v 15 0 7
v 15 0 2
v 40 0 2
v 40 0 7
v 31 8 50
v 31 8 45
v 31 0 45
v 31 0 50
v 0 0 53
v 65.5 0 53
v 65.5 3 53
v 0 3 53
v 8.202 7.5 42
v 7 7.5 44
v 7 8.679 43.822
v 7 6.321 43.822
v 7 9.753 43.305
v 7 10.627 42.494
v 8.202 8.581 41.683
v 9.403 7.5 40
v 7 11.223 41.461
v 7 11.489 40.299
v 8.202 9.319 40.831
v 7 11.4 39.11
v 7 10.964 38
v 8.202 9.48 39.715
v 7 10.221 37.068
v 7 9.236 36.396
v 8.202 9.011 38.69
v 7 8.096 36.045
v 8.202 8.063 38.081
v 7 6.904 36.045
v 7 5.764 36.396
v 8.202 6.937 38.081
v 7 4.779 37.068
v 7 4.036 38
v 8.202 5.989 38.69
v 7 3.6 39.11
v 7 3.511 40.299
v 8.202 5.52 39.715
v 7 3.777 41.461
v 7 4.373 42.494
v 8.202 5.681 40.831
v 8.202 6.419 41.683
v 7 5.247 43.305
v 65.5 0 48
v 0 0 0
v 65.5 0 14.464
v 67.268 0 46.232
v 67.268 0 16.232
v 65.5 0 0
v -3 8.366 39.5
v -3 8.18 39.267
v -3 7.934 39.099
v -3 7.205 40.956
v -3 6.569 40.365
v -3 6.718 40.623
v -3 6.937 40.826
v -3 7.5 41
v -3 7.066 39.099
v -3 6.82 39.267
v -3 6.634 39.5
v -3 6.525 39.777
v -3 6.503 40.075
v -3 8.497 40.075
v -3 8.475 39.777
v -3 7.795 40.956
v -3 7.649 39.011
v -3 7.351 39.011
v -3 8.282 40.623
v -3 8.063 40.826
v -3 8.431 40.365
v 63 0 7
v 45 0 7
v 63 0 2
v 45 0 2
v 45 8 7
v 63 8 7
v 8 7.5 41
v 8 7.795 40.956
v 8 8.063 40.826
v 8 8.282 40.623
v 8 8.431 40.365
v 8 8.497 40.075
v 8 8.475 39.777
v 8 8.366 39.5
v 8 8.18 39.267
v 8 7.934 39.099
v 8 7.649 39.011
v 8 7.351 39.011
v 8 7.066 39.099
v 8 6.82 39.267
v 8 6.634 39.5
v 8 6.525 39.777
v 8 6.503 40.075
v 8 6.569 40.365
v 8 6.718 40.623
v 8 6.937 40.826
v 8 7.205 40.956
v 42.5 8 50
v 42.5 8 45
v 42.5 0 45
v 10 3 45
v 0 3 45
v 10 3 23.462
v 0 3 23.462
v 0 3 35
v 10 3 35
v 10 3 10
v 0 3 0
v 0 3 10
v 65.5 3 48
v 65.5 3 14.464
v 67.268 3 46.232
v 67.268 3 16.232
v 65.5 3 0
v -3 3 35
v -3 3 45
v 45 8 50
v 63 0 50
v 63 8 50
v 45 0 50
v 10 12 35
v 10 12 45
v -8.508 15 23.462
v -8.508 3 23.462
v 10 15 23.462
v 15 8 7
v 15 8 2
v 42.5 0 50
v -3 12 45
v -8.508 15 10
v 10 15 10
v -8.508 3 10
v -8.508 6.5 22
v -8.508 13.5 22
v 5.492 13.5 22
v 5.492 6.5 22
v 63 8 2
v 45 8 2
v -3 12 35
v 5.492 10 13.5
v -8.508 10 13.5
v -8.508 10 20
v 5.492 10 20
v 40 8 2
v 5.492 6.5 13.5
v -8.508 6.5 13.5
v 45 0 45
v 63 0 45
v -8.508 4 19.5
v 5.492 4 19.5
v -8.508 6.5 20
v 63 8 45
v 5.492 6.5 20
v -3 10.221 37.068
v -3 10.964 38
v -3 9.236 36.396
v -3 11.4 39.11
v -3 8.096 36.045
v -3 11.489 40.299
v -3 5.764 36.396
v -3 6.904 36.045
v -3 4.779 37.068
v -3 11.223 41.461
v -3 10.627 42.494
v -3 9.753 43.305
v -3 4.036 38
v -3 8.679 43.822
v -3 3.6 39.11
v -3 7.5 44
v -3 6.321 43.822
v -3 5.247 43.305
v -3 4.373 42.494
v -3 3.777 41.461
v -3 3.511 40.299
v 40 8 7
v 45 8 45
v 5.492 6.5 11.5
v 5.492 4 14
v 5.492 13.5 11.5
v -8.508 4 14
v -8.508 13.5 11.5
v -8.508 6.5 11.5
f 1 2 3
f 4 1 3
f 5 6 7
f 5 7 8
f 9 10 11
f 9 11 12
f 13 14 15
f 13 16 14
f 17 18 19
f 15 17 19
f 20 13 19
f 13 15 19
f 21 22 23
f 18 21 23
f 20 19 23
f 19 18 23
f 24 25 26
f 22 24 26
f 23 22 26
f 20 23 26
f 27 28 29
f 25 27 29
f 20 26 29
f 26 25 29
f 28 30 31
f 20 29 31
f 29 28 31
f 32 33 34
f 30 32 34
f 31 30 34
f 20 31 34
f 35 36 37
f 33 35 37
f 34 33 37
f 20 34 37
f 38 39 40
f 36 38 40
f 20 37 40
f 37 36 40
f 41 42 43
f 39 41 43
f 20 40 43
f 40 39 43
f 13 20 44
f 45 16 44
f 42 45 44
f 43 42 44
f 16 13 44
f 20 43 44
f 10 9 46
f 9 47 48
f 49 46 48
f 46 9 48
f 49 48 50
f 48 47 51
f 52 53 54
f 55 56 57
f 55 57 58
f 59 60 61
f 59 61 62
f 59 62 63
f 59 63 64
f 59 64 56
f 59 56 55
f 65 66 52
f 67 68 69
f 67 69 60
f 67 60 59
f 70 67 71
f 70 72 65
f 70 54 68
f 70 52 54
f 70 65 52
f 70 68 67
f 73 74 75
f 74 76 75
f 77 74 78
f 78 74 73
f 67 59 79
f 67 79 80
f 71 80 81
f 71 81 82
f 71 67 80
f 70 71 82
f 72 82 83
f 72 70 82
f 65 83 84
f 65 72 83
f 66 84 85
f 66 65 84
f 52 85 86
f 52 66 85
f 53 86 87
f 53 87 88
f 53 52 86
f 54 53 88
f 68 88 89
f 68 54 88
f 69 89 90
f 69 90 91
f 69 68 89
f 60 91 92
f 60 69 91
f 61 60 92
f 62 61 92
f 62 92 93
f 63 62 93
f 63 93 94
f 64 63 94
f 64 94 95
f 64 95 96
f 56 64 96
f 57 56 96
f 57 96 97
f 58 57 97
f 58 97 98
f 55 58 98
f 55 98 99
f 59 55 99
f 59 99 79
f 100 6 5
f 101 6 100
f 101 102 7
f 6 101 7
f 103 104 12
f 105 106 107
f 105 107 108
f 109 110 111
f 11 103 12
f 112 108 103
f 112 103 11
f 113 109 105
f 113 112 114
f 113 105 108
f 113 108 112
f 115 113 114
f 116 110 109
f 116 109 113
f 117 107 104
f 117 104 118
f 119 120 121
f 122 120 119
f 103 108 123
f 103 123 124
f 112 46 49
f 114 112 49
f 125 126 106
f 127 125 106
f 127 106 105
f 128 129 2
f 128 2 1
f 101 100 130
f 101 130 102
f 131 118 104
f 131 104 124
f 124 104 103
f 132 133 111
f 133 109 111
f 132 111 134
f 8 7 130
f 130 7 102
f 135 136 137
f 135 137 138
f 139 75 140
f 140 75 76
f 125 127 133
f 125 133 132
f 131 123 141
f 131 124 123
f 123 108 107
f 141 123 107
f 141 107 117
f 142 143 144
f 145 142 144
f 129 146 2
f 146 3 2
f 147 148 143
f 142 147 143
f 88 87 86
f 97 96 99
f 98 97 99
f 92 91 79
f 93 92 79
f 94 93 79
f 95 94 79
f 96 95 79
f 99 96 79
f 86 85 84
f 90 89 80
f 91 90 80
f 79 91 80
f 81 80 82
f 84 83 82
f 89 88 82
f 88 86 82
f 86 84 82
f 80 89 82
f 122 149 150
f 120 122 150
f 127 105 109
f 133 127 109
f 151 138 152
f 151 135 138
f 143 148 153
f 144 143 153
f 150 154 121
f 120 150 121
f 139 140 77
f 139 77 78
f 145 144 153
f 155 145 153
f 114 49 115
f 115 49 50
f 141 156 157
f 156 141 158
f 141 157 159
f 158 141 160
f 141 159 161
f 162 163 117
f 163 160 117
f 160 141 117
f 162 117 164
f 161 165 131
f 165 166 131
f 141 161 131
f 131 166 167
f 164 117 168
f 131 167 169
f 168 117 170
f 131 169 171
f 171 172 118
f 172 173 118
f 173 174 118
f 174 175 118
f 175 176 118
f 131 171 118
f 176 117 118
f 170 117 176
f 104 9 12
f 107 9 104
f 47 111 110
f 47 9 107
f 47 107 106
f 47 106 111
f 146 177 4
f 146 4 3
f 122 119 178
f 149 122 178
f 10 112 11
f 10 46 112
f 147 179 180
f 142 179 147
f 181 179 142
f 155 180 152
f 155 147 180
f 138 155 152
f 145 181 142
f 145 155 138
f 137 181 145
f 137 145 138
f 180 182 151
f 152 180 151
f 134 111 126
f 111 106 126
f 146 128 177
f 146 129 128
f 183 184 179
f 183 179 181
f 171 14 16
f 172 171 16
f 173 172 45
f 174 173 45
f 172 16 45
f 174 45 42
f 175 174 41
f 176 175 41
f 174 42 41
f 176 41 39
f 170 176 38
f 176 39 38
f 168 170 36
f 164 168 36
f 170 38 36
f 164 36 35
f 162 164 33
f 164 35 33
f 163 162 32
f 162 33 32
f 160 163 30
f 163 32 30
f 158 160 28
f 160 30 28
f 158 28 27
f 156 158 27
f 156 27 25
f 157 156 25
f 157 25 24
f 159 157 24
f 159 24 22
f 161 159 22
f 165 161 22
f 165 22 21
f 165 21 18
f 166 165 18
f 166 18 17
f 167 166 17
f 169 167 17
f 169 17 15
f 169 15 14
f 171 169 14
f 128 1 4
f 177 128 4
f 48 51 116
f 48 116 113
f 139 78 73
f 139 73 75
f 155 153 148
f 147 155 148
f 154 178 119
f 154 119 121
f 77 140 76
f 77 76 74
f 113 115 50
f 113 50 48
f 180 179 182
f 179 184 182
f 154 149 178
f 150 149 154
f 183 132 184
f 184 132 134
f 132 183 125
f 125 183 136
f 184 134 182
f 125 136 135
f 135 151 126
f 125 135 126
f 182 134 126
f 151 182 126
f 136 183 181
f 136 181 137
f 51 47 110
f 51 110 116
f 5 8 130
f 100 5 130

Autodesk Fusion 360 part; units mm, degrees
sketch "Sketch1" plane through (0, 0, 0) normal (0, 1, 0) x (1, 0, 0)
  line L0 (0, 0) -> (65.5, 0)
  line L1 (65.5, 0) -> (65.5, -53)
  line L2 (65.5, -53) -> (0, -53)
  line L3 (0, -53) -> (0, 0)
  line L4 (65.5, -53) -> (65.5, -48) construction
  line L5 (65.5, -48) -> (67.2678, -46.2322)
  line L6 (65.5, -48) -> (68, -48) construction
  line L7 (67.2678, -46.2322) -> (67.2678, -16.2322)
  line L8 (67.2678, -16.2322) -> (65.5, -14.4645)
  line L9 (67.2678, -16.2322) -> (64.7678, -16.2322) construction
  dimension "d1" = 65.5
  dimension "d2" = 53
  dimension "d3" = 5
  dimension "d4" = 45
  dimension "d5" = 2.5
  dimension "d6" = 30
  dimension "d7" = 45
  dimension "d8" = 2.5
sketch "Sketch2" plane through (0, 0, 0) normal (0, 1, 0) x (1, 0, 0)
  line L0 (63, -2) -> (45, -2)
  line L1 (45, -2) -> (45, -7)
  line L2 (45, -7) -> (63, -7)
  line L3 (63, -7) -> (63, -2)
  line L4 (40, -2) -> (15, -2)
  line L5 (15, -2) -> (15, -7)
  line L6 (15, -7) -> (40, -7)
  line L7 (40, -7) -> (40, -2)
  line L8 (63, -50) -> (45, -50)
  line L9 (45, -50) -> (45, -45)
  line L10 (45, -45) -> (63, -45)
  line L11 (63, -45) -> (63, -50)
  line L12 (42.5, -45) -> (31, -45)
  line L13 (31, -45) -> (31, -50)
  line L14 (31, -50) -> (42.5, -50)
  line L15 (42.5, -50) -> (42.5, -45)
extrude "Extrude1" add sketch "Sketch1" sketch "Sketch2" along normal blind 3 of sketch 2 contours L0 L1 L2 L3 | L4 L5 L6 L7 makes body 1
sketch "Sketch3" plane through (0, 0, 0) normal (0, -1, 0) x (1, 0, 0)
  line L0 (67.2678, 46.2322) -> (65.5, 48)
  line L1 (65.5, 48) -> (65.5, 53)
  line L2 (65.5, 53) -> (0, 53)
  line L3 (0, 53) -> (0, 0)
  line L4 (0, 0) -> (65.5, 0)
  line L5 (65.5, 0) -> (65.5, 14.4645)
  line L6 (65.5, 14.4645) -> (67.2678, 16.2322)
  line L7 (67.2678, 16.2322) -> (67.2678, 46.2322)
extrude "Extrude2" add sketch "Sketch2" along normal blind 8 separate body makes body 2 at (51, 2.6667, 7) makes body 3 at (34.8333, 2.6667, 50) makes body 4 at (23.3333, 2.6667, 7) makes body 5 at (57, 2.6667, 50)
sketch "Sketch4" plane through (0, 3, 0) normal (0, 1, 0) x (-1, 0, 0)
  line L0 (-65.5, 48) -> (-67.2678, 46.2322)
  line L1 (-67.2678, 46.2322) -> (-67.2678, 16.2322)
  line L2 (-67.2678, 16.2322) -> (-65.5, 14.4645)
  line L3 (-65.5, 14.4645) -> (-65.5, 0)
  line L4 (-65.5, 0) -> (0, 0)
  line L5 (0, 0) -> (0, 53)
  line L6 (0, 53) -> (-65.5, 53)
  line L7 (-65.5, 53) -> (-65.5, 48)
  line L8 (0, 35) -> (-10, 35)
  line L9 (-10, 35) -> (-10, 45)
  line L10 (-10, 45) -> (0, 45)
  line L11 (0, 45) -> (0, 35)
  line L12 (0, 35) -> (3, 35)
  line L13 (3, 35) -> (3, 45)
  line L14 (3, 45) -> (0, 45)
  line L15 (0, 45) -> (0, 35)
extrude "Extrude3" add sketch "Sketch4" along normal blind 9 contours L5 L11 L12 L13 L14 L15 | L5 L8 L9 L10 L11 L15 bodies 1
sketch "Sketch5" plane through (-3, 0, 0) normal (-1, 0, 0) x (0, 0, 1)
  line L0 (35, 3) -> (45, 3)
  line L1 (45, 3) -> (45, 12)
  line L2 (45, 12) -> (35, 12)
  line L3 (35, 12) -> (35, 3)
hole "Hole1" at (-3, 7.5, 40) direction (1, 0, 0) diameter 8 depth 10 tip angle 118 bodies 1
sketch "Sketch6" plane through (-3, 7.5, 40) normal (-1, 0, 0) x (0, 0, 1)
  circle A0 centre (0, 0) radius 1
extrude "Extrude4" add sketch "Sketch6" against normal blind 11 separate body makes body 6
sketch "Sketch7" plane through (0, 3, 0) normal (0, 1, 0) x (-1, 0, 0)
  line L0 (-10, 45) -> (0, 45)
  line L1 (0, 45) -> (0, 53)
  line L2 (0, 53) -> (-65.5, 53)
  line L3 (-65.5, 53) -> (-65.5, 48)
  line L4 (-65.5, 48) -> (-67.2678, 46.2322)
  line L5 (-67.2678, 46.2322) -> (-67.2678, 16.2322)
  line L6 (-67.2678, 16.2322) -> (-65.5, 14.4645)
  line L7 (-65.5, 14.4645) -> (-65.5, 0)
  line L8 (-65.5, 0) -> (0, 0)
  line L9 (0, 0) -> (0, 35)
  line L10 (0, 35) -> (-10, 35)
  line L11 (-10, 35) -> (-10, 45)
  line L12 (-10, 10) -> (8.5084, 10)
  line L13 (8.5084, 10) -> (8.5084, 23.4625)
  line L14 (8.5084, 23.4625) -> (-10, 23.4625)
  line L15 (-10, 23.4625) -> (-10, 10)
extrude "Extrude5" add sketch "Sketch7" along normal blind 12 contours L9 L12 L13 L14 | L9 L12 L14 L15 bodies 1
sketch "Sketch8" plane through (-8.5084, 0, 0) normal (-1, 0, 0) x (0, 0, 1)
  line L0 (10, 3) -> (23.4625, 3)
  line L1 (23.4625, 3) -> (23.4625, 15)
  line L2 (23.4625, 15) -> (10, 15)
  line L3 (10, 15) -> (10, 3)
  line L4 (11.5, 13.5) -> (22, 13.5)
  line L5 (22, 13.5) -> (22, 6.5)
  line L6 (22, 6.5) -> (19.5, 4)
  line L7 (11.5, 6.5) -> (11.5, 13.5)
  line L8 (11.5, 6.5) -> (14, 4)
  line L9 (11.5, 6.5) -> (15.0355, 6.5) construction
  line L10 (14, 4) -> (19.5, 4)
  line L11 (13.5, 10) -> (20, 10)
  line L12 (20, 10) -> (20, 6.5)
  line L13 (20, 6.5) -> (13.5, 6.5)
  line L14 (13.5, 6.5) -> (13.5, 10)
  dimension "d22" = 45
extrude "Extrude6" cut sketch "Sketch8" against normal blind 14 contours L4 L5 L6 L7 L8 L10 bodies 1
copy_body "Body->Comp1" bodies 1 removing the originals makes body 7 in component "Arduino"
copy_body "Body->Comp2" bodies 3 removing the originals makes body 8 in component "Component"
copy_body "Body->Comp3" bodies 2 removing the originals makes body 9 in component "Component'"
copy_body "Body->Comp4" bodies 5 removing the originals makes body 10 in component "Component''"
copy_body "Body->Comp5" bodies 4 removing the originals makes body 11 in component "Component'''"
copy_body "Body->Comp6" bodies 6 removing the originals makes body 12 in component "Component''''"
component "Arduino" placed x (1, 0, 0) y (0, 1, 0) z (0, 0, 1) at (0, 0, 0)
component "Component''''" placed x (1, 0, 0) y (0, 1, 0) z (0, 0, 1) at (0, 0, 0) in component "Arduino"
component "Component'''" placed x (1, 0, 0) y (0, 1, 0) z (0, 0, 1) at (0, 0, 0) in component "Arduino"
component "Component" placed x (1, 0, 0) y (0, 1, 0) z (0, 0, 1) at (0, 0, 0) in component "Arduino"
component "Component'" placed x (1, 0, 0) y (0, 1, 0) z (0, 0, 1) at (0, 0, 0) in component "Arduino"
component "Component''" placed x (1, 0, 0) y (0, 1, 0) z (0, 0, 1) at (0, 0, 0) in component "Arduino"
